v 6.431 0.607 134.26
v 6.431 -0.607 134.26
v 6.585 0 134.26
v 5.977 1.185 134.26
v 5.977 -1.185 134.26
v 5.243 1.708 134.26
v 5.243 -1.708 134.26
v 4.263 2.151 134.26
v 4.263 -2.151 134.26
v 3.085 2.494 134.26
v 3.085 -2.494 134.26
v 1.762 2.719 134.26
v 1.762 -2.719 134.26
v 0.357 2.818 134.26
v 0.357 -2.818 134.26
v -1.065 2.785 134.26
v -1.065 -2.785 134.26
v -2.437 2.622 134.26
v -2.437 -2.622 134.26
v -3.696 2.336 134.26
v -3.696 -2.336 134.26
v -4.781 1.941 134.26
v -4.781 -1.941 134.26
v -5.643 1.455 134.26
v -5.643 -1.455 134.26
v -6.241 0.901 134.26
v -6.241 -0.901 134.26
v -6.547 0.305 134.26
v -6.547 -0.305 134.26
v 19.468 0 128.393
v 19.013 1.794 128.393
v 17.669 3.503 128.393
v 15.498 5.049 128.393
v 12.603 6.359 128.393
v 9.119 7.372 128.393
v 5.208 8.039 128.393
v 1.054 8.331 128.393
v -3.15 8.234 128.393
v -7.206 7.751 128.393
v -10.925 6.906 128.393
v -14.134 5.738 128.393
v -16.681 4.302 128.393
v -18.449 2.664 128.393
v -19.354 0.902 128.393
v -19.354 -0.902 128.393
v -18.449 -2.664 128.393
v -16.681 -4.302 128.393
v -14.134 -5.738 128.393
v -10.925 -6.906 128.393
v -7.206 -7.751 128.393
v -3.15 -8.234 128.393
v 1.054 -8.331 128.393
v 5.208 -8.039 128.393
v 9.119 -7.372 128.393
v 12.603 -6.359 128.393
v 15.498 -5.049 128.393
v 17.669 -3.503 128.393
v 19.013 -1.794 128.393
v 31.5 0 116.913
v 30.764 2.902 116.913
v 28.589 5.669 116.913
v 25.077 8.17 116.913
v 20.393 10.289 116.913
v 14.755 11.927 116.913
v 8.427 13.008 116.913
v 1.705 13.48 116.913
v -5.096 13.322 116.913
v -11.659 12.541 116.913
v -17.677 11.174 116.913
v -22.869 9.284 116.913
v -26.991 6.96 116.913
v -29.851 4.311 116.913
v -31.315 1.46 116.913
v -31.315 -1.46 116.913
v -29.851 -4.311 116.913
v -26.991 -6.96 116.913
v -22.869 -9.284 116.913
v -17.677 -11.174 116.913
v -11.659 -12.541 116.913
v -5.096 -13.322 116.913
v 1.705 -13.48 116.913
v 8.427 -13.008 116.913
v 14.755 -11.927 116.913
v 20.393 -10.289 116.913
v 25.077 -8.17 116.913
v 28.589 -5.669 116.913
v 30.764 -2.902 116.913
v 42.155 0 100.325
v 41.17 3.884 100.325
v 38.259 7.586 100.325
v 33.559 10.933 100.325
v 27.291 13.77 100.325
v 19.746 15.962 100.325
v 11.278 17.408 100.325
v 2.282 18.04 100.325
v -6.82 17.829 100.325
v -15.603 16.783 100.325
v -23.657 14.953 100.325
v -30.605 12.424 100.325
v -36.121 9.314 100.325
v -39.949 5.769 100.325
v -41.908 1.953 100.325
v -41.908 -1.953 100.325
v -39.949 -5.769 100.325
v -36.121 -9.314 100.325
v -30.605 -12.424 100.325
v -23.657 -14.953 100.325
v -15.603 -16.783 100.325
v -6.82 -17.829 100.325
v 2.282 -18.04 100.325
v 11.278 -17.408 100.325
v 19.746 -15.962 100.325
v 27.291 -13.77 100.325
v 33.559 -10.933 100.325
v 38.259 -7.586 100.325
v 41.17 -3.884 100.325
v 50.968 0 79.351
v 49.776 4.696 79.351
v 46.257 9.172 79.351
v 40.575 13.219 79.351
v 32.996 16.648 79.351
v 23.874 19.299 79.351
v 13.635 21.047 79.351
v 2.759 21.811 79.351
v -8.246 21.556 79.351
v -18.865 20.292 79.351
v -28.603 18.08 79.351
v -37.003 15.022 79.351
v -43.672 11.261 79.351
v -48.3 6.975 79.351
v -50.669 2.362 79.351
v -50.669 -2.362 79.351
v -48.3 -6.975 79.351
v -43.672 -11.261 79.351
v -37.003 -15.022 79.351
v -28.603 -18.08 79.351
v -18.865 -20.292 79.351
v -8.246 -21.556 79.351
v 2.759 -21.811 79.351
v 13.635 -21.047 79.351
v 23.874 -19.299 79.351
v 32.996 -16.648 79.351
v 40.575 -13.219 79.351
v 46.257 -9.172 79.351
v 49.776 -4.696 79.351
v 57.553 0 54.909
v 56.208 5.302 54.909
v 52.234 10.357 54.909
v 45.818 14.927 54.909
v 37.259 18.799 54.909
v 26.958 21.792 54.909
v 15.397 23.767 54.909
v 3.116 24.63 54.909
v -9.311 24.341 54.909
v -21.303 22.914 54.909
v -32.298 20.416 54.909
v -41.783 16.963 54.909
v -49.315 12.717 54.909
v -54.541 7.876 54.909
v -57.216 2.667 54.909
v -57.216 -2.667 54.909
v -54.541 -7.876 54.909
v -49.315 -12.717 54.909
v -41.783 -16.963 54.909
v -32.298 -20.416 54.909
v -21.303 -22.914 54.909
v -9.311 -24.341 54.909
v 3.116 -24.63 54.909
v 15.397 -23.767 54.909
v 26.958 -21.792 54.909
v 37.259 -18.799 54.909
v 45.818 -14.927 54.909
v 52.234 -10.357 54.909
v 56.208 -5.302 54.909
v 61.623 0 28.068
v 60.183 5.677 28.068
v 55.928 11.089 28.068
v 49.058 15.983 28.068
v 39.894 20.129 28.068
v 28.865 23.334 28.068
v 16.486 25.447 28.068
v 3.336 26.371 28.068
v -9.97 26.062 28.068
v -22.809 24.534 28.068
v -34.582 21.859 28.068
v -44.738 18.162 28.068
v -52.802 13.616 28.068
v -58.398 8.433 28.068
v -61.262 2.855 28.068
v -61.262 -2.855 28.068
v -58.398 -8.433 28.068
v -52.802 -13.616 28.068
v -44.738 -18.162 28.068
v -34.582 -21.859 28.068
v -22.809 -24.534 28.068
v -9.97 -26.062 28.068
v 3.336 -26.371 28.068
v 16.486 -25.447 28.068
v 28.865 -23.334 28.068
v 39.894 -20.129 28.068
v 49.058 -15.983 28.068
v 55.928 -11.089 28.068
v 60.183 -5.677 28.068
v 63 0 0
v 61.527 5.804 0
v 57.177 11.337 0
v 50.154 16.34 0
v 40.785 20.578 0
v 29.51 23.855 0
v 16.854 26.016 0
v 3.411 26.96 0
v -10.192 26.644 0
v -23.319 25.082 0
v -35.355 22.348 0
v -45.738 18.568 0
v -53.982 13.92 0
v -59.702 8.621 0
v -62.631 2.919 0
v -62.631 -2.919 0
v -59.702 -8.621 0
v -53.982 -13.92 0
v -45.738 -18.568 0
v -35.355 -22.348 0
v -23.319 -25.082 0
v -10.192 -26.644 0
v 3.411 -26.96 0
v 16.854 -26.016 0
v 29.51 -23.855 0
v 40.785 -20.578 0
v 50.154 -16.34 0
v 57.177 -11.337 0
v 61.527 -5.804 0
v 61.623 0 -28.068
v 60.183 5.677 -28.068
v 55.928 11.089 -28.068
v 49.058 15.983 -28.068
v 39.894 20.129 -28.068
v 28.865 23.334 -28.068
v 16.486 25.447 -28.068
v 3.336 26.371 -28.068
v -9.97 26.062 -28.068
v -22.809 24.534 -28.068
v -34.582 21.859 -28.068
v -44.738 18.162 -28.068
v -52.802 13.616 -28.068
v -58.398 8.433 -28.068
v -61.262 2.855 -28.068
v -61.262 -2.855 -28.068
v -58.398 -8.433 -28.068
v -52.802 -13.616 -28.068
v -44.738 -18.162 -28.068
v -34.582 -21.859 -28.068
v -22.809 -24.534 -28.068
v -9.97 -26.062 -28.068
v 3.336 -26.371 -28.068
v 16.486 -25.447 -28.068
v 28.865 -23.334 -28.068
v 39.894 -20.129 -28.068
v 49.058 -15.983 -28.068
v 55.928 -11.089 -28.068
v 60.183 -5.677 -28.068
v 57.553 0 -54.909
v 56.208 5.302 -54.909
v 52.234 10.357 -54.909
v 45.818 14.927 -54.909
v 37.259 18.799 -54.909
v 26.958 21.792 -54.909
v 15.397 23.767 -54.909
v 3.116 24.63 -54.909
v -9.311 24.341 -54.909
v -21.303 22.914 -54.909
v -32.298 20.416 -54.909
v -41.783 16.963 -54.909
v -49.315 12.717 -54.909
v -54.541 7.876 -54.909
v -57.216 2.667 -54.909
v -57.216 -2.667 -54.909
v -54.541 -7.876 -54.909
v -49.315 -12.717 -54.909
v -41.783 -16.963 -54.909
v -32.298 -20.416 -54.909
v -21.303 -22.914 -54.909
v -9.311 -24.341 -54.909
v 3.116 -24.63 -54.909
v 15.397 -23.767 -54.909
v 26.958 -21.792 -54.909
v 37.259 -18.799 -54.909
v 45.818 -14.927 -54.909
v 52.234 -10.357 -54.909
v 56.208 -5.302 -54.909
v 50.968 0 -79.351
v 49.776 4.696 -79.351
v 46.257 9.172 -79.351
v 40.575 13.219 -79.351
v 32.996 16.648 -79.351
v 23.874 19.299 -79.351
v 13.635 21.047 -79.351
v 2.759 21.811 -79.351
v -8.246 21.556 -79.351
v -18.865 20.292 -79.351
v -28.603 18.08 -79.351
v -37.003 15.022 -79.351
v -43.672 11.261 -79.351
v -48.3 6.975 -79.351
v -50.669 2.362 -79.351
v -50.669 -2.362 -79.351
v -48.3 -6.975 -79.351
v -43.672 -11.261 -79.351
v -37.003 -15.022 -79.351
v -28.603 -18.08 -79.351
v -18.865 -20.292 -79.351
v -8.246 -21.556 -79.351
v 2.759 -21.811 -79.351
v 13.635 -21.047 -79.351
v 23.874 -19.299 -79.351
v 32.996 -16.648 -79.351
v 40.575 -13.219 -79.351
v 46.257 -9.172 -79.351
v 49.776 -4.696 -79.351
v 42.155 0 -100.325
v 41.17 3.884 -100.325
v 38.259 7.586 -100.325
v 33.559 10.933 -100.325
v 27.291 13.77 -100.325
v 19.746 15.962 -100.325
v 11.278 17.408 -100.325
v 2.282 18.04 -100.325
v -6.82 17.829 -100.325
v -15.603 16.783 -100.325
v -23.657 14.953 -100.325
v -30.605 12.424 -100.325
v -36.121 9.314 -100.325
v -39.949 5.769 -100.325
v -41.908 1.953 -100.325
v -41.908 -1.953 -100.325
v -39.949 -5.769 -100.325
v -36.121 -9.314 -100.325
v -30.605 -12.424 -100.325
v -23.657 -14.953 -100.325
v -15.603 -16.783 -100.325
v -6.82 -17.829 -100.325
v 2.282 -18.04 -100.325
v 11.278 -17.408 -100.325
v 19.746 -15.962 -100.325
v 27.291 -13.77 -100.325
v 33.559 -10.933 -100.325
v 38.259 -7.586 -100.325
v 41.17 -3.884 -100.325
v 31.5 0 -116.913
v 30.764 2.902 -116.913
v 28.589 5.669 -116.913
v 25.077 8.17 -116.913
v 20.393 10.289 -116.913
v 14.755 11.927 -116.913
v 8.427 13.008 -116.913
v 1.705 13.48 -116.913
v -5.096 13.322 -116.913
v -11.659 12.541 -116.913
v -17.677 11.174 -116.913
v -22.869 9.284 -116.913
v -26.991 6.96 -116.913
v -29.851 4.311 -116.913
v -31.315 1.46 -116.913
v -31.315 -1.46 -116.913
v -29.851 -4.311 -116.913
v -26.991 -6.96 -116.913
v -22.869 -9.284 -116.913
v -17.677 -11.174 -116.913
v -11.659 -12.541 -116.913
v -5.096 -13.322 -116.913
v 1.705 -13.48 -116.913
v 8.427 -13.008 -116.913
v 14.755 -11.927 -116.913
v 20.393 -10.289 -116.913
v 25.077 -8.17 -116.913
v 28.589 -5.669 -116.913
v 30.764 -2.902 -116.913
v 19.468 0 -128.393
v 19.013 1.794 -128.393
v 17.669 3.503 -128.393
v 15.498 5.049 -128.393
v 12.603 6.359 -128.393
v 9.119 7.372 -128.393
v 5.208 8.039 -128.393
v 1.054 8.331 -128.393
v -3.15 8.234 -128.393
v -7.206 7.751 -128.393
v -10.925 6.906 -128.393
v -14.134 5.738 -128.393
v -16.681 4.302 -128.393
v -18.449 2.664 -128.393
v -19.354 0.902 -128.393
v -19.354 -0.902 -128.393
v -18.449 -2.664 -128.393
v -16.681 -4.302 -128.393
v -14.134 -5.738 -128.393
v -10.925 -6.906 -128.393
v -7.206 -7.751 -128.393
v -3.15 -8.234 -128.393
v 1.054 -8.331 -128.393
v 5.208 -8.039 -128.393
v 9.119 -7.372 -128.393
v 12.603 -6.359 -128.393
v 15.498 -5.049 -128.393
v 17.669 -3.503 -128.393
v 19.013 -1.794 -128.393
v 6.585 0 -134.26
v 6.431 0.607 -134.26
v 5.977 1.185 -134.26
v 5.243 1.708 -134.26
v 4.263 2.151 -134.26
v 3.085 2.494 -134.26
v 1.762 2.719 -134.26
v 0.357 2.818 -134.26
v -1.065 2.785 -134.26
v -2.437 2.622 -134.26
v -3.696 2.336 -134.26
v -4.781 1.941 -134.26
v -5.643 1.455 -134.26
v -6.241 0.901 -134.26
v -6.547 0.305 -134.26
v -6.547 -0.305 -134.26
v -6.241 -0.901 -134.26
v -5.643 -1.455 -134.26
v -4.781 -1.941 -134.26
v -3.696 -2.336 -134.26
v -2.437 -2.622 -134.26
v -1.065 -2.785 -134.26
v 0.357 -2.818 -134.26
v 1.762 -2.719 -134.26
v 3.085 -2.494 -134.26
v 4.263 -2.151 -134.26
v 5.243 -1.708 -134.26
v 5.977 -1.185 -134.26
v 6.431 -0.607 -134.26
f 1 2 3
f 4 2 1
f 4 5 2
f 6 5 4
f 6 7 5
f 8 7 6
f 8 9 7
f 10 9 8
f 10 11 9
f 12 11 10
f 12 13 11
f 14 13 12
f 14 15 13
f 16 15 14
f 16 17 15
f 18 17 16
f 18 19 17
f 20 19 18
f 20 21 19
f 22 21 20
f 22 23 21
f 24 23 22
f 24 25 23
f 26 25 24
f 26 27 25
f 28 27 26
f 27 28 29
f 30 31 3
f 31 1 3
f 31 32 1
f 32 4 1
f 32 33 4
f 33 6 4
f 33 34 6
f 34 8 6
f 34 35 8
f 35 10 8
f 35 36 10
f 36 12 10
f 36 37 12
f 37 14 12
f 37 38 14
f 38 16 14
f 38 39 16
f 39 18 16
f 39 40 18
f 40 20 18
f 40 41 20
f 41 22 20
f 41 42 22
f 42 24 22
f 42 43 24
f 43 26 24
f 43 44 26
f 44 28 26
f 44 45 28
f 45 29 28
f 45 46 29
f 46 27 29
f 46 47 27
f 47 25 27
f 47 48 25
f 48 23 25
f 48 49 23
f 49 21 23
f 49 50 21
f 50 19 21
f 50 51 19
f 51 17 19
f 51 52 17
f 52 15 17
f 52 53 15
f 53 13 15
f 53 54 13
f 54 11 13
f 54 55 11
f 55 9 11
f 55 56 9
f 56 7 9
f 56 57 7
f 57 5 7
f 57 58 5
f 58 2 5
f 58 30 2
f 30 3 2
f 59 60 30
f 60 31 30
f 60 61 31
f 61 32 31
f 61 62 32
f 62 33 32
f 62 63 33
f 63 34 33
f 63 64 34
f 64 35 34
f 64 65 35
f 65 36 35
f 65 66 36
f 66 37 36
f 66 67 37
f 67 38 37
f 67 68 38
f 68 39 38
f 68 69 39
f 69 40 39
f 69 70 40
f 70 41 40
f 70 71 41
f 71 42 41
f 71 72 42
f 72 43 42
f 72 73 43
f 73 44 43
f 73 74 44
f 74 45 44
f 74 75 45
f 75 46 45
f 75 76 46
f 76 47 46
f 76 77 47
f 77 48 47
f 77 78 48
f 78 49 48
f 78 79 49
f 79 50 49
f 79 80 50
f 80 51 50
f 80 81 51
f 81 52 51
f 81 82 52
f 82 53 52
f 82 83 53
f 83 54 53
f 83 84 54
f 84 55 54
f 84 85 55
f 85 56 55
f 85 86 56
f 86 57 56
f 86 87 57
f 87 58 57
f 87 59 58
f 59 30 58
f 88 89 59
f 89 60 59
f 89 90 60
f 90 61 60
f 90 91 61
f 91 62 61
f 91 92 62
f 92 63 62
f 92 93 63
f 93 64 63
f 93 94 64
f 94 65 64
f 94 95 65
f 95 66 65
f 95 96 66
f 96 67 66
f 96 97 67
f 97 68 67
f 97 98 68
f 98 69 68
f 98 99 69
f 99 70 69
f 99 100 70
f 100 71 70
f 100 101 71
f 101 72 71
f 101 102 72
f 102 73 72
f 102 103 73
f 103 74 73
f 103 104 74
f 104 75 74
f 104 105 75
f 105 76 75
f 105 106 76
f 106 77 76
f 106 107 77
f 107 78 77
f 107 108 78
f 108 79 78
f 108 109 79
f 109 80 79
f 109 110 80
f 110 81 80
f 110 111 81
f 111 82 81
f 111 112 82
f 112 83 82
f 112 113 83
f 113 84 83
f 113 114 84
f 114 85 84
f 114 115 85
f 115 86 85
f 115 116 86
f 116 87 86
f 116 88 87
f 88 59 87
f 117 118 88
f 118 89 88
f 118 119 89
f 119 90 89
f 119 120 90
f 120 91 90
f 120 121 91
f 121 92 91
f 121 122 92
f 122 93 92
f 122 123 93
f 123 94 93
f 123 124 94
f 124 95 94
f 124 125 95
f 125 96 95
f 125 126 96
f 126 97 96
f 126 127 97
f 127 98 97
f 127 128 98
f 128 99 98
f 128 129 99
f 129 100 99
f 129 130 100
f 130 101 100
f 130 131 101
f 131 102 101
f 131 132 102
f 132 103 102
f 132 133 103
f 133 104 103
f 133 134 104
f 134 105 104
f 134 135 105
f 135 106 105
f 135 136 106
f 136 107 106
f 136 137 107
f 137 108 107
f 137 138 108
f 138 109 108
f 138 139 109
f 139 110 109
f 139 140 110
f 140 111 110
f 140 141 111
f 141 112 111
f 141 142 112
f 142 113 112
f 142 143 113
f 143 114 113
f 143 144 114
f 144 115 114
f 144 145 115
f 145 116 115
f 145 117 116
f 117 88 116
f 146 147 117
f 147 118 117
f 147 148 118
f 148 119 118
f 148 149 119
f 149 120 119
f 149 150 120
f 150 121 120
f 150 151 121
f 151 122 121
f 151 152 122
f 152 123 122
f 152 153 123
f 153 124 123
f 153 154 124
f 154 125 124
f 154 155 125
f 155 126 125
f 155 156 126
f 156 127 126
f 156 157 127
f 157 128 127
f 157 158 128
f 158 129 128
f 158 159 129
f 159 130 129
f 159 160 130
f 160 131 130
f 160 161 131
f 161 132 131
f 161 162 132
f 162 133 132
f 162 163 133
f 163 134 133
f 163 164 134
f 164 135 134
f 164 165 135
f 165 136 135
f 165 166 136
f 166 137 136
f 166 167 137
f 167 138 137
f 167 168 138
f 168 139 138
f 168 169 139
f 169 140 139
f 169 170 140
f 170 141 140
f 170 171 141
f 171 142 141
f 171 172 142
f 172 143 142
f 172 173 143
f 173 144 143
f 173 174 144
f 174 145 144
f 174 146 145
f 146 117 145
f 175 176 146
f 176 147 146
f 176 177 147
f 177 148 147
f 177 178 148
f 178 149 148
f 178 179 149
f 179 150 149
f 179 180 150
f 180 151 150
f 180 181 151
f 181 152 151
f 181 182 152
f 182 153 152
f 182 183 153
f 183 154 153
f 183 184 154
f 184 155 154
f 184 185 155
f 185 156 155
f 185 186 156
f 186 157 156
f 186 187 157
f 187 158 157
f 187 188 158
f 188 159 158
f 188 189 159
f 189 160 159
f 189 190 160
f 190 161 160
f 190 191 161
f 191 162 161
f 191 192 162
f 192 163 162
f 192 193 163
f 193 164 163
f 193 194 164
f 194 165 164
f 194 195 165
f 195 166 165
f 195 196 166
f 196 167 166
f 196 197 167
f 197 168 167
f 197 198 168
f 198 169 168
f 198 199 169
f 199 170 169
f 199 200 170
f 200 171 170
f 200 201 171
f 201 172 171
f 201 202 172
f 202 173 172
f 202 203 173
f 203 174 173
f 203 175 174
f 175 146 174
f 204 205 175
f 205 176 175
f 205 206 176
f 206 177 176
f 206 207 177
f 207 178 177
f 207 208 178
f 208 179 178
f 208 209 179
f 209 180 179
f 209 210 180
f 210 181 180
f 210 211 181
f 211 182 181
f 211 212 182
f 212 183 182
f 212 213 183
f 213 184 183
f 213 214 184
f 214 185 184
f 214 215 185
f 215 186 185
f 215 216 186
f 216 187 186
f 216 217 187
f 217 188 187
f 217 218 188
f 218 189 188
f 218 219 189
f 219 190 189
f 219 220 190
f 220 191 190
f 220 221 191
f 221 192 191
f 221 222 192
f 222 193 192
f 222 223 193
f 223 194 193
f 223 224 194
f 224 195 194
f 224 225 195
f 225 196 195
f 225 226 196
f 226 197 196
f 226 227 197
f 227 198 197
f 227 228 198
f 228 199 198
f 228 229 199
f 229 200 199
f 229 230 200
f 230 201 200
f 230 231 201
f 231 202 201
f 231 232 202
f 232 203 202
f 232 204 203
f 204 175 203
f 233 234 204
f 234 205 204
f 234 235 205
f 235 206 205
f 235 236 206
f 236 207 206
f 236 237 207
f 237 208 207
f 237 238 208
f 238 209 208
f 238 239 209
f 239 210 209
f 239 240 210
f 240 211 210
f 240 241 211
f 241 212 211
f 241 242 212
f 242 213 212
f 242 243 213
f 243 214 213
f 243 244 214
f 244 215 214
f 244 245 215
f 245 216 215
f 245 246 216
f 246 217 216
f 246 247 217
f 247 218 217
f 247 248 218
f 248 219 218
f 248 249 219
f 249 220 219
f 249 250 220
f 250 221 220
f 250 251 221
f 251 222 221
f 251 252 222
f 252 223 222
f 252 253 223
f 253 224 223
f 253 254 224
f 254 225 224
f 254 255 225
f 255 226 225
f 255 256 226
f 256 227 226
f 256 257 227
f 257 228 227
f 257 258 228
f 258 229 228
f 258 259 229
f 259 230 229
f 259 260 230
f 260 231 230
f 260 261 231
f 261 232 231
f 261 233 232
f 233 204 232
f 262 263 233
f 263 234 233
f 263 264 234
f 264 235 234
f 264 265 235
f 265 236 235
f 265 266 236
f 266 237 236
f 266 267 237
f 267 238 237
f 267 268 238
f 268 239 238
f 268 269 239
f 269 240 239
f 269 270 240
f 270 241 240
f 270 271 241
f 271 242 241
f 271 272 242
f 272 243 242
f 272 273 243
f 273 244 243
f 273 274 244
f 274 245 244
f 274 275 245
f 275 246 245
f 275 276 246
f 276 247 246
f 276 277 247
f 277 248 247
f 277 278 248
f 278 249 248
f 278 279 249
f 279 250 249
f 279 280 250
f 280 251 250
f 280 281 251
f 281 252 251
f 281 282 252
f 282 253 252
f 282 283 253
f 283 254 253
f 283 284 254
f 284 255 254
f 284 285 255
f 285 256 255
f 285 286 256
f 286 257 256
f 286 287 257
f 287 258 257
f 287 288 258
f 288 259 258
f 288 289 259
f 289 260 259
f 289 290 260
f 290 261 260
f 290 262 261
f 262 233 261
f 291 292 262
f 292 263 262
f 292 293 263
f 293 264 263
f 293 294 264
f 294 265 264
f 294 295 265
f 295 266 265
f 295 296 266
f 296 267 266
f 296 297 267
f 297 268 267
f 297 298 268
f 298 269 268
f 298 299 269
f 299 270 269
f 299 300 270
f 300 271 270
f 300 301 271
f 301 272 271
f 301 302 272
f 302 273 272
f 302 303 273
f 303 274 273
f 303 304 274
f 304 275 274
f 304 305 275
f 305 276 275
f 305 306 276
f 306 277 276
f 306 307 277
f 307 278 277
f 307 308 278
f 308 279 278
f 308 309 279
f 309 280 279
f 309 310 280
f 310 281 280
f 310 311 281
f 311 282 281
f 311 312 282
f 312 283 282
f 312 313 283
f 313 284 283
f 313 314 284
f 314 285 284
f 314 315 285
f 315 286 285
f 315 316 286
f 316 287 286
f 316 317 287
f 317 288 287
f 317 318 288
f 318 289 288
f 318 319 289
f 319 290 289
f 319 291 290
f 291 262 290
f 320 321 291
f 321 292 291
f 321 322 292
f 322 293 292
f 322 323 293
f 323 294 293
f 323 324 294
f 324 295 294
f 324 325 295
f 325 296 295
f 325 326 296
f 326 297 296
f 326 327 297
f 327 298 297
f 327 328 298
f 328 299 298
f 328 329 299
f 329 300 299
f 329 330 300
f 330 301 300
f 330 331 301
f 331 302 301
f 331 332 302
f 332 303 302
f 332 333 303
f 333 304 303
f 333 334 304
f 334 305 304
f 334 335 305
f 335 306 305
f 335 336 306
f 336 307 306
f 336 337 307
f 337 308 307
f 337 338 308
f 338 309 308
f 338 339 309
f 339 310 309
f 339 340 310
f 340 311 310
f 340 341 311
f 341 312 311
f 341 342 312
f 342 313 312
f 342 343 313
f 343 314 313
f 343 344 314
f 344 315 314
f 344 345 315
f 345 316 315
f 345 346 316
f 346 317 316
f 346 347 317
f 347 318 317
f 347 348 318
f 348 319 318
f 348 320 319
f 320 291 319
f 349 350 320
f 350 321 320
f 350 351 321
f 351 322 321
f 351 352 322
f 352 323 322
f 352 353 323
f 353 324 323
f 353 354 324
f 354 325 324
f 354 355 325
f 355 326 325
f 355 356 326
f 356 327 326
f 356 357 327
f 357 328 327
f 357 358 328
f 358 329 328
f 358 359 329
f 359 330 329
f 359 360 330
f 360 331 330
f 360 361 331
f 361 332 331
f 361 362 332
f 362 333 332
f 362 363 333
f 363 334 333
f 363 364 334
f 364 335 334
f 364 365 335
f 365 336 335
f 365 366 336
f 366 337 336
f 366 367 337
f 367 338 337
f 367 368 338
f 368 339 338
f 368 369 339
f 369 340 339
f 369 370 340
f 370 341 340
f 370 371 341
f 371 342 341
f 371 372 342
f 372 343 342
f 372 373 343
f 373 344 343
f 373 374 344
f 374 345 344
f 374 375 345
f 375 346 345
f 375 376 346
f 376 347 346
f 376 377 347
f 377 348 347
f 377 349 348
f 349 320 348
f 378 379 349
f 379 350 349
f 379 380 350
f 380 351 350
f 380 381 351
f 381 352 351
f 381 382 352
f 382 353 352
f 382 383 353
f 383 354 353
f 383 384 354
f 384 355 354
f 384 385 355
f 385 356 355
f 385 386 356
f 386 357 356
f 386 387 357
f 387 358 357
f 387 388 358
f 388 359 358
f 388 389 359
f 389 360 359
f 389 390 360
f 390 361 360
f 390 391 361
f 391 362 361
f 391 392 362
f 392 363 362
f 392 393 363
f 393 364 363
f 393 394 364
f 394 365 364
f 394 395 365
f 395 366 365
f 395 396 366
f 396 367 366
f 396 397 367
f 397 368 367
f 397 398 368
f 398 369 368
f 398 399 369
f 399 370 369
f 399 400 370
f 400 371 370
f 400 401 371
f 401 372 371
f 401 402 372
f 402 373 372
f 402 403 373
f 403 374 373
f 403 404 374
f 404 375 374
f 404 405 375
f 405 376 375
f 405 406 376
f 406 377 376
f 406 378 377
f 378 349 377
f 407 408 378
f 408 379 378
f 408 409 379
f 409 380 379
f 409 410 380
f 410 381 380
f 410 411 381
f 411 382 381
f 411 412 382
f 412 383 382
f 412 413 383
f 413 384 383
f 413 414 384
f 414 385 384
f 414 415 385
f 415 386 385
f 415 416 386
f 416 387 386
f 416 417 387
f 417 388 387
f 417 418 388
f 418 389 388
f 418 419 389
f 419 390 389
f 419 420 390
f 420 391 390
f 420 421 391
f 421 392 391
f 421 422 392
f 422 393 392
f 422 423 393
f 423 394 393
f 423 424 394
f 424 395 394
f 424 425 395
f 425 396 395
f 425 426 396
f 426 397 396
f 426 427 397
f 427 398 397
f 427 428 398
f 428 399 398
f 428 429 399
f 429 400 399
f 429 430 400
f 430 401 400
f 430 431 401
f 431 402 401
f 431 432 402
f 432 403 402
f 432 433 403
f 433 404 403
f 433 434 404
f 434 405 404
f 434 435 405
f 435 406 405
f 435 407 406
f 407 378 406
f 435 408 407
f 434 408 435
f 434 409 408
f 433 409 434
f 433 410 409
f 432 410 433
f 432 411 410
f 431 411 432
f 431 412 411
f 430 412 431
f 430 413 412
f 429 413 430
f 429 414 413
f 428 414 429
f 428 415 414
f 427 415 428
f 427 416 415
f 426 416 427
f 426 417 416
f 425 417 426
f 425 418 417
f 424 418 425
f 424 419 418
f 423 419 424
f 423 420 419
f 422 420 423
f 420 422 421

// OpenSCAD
// Generated by SolidPython 1.0.1 on 2020-07-29 00:46:47


scale(v = [7, 3, 15]) {
	sphere(r = 9);
}
/***********************************************
*********      SolidPython code:      **********
************************************************
 
# import packages: SolidPython
from solid import *
from solid.utils import *
from itertools import chain, combinations, permutations


class Resize:

    def __init__(self, scad_file):
        self.scad_file = scad_file
        #self.scad_file = import_scad(scad_file)
        # cone/cylinder param:
        self.r1 = 0
        self.r2 = 0
        self.h = 0
        # rectangular prism param:
        self.w = 0
        self.l = 0
        # ellipse param:
        self.r = 0

    # import OpenScad code (file name corresponds to shape)


    # classify shape + parameters
    def assign(self, param1, param2, param3):
        if self.scad_file == 'cone.scad':
            self.r1 = param1
            self.r2 = param2
            self.h = param3
        elif self.scad_file == 'cylinder.scad':
            self.r1 = param1
            self.r2 = param2
            self.h = param3
        elif self.scad_file == 'rectangularPrism.scad':
            self.h = param1
            self.l = param2
            self.w = param3
        else:
            self.r = param1
            self.h = param2

    # resize parameters
    def iterate(self):
        x = range(3, 20, 2)
        i = 1
        if self.scad_file == 'cone.scad':
            tempList = list(permutations(x, 2))
            for temp in tempList:
                param1 = temp[0]
                param2 = temp[1]
                filepath = 'produced_scad_files/' + 'cone' + str(param1) + '_' + str(param2) + '_' + '.scad'
                scad_render_to_file(cylinder(h=param1, r1=param2, r2=0), filepath)

        elif self.scad_file == 'cylinder.scad':
            tempList = list(permutations(x, 3))
            for temp in tempList:
                param1 = temp[0]
                param2 = temp[1]
                filepath = 'produced_scad_files/' + 'cylinder' + str(param1) + '_' + str(param2) + '_' + '.scad'
                scad_render_to_file(cylinder(h=param1, r1=param2, r2=param2), filepath)

        elif self.scad_file == 'rectangularPrism.scad':
            tempList = list(permutations(x, 3))
            for temp in tempList:
                param1 = temp[0]
                param2 = temp[1]
                param3 = temp[2]
                filepath = 'produced_scad_files/' + 'rectangularPrism' + str(param1) + '_' + str(param2) + '_' + str(
                    param3) + '.scad'
                scad_render_to_file(cube(size=(param1, param2, param3)), filepath)

        elif self.scad_file == 'ellipse.scad':
            tempList = list(permutations(x, 4))
            for temp in tempList:
                param1 = temp[0]
                param2 = temp[1]
                param3 = temp[2]
                param4 = temp[3]
                filepath = 'produced_scad_files/' + 'ellipse' + str(param1) + '_' + str(param2) + '_' + str(param3) + '_' + str(param4) + '.scad'
                scad_render_to_file(scale([param1, param2, param3])(sphere(r=param4)), filepath)

    def render_to_scadfile(self):
        scad_render_to_file(scad, 'example.scad') 
 
************************************************/
